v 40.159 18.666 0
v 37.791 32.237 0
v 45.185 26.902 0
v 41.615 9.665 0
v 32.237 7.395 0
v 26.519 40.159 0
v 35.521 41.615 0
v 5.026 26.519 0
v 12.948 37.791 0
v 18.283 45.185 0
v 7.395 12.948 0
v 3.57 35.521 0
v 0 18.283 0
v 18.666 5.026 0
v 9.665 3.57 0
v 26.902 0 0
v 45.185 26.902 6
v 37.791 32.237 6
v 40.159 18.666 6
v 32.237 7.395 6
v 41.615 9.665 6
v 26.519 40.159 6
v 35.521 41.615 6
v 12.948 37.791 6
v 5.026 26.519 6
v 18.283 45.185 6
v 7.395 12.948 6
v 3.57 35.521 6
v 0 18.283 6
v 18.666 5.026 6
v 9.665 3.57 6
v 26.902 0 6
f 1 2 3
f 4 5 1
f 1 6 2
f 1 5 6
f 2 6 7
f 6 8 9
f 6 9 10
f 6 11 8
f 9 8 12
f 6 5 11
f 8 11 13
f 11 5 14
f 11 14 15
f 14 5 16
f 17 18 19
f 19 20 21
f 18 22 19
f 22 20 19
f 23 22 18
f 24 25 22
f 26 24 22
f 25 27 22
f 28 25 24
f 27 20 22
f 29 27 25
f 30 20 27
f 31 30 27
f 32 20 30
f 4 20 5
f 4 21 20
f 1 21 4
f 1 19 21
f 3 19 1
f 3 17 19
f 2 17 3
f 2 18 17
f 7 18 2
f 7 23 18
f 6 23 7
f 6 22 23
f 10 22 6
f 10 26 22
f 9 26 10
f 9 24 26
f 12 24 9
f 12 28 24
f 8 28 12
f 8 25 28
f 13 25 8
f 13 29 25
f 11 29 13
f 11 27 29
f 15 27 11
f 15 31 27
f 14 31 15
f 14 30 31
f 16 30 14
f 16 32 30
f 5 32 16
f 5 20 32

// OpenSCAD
$fn = 32;

// ----------------------------------------------------------------------
// Chain sprocket: 8 teeth, 18 mm root radius
// ----------------------------------------------------------------------

// --- parameters (mm) ---
profile_height = 6;       // extrusion height
profile_points = 16;      // points of the closed outline

profile = [[40.159, 18.666], [45.185, 26.902], [37.791, 32.237], [35.521, 41.615], [26.519, 40.159], [18.283, 45.185], [12.948, 37.791], [3.57, 35.521], [5.026, 26.519], [0, 18.283], [7.395, 12.948], [9.665, 3.57], [18.666, 5.026], [26.902, 0], [32.237, 7.395], [41.615, 9.665]];  // single closed polygon, 16 points, counter clockwise

// --- the one profile operation ---
linear_extrude(height = profile_height) polygon(points = profile);
